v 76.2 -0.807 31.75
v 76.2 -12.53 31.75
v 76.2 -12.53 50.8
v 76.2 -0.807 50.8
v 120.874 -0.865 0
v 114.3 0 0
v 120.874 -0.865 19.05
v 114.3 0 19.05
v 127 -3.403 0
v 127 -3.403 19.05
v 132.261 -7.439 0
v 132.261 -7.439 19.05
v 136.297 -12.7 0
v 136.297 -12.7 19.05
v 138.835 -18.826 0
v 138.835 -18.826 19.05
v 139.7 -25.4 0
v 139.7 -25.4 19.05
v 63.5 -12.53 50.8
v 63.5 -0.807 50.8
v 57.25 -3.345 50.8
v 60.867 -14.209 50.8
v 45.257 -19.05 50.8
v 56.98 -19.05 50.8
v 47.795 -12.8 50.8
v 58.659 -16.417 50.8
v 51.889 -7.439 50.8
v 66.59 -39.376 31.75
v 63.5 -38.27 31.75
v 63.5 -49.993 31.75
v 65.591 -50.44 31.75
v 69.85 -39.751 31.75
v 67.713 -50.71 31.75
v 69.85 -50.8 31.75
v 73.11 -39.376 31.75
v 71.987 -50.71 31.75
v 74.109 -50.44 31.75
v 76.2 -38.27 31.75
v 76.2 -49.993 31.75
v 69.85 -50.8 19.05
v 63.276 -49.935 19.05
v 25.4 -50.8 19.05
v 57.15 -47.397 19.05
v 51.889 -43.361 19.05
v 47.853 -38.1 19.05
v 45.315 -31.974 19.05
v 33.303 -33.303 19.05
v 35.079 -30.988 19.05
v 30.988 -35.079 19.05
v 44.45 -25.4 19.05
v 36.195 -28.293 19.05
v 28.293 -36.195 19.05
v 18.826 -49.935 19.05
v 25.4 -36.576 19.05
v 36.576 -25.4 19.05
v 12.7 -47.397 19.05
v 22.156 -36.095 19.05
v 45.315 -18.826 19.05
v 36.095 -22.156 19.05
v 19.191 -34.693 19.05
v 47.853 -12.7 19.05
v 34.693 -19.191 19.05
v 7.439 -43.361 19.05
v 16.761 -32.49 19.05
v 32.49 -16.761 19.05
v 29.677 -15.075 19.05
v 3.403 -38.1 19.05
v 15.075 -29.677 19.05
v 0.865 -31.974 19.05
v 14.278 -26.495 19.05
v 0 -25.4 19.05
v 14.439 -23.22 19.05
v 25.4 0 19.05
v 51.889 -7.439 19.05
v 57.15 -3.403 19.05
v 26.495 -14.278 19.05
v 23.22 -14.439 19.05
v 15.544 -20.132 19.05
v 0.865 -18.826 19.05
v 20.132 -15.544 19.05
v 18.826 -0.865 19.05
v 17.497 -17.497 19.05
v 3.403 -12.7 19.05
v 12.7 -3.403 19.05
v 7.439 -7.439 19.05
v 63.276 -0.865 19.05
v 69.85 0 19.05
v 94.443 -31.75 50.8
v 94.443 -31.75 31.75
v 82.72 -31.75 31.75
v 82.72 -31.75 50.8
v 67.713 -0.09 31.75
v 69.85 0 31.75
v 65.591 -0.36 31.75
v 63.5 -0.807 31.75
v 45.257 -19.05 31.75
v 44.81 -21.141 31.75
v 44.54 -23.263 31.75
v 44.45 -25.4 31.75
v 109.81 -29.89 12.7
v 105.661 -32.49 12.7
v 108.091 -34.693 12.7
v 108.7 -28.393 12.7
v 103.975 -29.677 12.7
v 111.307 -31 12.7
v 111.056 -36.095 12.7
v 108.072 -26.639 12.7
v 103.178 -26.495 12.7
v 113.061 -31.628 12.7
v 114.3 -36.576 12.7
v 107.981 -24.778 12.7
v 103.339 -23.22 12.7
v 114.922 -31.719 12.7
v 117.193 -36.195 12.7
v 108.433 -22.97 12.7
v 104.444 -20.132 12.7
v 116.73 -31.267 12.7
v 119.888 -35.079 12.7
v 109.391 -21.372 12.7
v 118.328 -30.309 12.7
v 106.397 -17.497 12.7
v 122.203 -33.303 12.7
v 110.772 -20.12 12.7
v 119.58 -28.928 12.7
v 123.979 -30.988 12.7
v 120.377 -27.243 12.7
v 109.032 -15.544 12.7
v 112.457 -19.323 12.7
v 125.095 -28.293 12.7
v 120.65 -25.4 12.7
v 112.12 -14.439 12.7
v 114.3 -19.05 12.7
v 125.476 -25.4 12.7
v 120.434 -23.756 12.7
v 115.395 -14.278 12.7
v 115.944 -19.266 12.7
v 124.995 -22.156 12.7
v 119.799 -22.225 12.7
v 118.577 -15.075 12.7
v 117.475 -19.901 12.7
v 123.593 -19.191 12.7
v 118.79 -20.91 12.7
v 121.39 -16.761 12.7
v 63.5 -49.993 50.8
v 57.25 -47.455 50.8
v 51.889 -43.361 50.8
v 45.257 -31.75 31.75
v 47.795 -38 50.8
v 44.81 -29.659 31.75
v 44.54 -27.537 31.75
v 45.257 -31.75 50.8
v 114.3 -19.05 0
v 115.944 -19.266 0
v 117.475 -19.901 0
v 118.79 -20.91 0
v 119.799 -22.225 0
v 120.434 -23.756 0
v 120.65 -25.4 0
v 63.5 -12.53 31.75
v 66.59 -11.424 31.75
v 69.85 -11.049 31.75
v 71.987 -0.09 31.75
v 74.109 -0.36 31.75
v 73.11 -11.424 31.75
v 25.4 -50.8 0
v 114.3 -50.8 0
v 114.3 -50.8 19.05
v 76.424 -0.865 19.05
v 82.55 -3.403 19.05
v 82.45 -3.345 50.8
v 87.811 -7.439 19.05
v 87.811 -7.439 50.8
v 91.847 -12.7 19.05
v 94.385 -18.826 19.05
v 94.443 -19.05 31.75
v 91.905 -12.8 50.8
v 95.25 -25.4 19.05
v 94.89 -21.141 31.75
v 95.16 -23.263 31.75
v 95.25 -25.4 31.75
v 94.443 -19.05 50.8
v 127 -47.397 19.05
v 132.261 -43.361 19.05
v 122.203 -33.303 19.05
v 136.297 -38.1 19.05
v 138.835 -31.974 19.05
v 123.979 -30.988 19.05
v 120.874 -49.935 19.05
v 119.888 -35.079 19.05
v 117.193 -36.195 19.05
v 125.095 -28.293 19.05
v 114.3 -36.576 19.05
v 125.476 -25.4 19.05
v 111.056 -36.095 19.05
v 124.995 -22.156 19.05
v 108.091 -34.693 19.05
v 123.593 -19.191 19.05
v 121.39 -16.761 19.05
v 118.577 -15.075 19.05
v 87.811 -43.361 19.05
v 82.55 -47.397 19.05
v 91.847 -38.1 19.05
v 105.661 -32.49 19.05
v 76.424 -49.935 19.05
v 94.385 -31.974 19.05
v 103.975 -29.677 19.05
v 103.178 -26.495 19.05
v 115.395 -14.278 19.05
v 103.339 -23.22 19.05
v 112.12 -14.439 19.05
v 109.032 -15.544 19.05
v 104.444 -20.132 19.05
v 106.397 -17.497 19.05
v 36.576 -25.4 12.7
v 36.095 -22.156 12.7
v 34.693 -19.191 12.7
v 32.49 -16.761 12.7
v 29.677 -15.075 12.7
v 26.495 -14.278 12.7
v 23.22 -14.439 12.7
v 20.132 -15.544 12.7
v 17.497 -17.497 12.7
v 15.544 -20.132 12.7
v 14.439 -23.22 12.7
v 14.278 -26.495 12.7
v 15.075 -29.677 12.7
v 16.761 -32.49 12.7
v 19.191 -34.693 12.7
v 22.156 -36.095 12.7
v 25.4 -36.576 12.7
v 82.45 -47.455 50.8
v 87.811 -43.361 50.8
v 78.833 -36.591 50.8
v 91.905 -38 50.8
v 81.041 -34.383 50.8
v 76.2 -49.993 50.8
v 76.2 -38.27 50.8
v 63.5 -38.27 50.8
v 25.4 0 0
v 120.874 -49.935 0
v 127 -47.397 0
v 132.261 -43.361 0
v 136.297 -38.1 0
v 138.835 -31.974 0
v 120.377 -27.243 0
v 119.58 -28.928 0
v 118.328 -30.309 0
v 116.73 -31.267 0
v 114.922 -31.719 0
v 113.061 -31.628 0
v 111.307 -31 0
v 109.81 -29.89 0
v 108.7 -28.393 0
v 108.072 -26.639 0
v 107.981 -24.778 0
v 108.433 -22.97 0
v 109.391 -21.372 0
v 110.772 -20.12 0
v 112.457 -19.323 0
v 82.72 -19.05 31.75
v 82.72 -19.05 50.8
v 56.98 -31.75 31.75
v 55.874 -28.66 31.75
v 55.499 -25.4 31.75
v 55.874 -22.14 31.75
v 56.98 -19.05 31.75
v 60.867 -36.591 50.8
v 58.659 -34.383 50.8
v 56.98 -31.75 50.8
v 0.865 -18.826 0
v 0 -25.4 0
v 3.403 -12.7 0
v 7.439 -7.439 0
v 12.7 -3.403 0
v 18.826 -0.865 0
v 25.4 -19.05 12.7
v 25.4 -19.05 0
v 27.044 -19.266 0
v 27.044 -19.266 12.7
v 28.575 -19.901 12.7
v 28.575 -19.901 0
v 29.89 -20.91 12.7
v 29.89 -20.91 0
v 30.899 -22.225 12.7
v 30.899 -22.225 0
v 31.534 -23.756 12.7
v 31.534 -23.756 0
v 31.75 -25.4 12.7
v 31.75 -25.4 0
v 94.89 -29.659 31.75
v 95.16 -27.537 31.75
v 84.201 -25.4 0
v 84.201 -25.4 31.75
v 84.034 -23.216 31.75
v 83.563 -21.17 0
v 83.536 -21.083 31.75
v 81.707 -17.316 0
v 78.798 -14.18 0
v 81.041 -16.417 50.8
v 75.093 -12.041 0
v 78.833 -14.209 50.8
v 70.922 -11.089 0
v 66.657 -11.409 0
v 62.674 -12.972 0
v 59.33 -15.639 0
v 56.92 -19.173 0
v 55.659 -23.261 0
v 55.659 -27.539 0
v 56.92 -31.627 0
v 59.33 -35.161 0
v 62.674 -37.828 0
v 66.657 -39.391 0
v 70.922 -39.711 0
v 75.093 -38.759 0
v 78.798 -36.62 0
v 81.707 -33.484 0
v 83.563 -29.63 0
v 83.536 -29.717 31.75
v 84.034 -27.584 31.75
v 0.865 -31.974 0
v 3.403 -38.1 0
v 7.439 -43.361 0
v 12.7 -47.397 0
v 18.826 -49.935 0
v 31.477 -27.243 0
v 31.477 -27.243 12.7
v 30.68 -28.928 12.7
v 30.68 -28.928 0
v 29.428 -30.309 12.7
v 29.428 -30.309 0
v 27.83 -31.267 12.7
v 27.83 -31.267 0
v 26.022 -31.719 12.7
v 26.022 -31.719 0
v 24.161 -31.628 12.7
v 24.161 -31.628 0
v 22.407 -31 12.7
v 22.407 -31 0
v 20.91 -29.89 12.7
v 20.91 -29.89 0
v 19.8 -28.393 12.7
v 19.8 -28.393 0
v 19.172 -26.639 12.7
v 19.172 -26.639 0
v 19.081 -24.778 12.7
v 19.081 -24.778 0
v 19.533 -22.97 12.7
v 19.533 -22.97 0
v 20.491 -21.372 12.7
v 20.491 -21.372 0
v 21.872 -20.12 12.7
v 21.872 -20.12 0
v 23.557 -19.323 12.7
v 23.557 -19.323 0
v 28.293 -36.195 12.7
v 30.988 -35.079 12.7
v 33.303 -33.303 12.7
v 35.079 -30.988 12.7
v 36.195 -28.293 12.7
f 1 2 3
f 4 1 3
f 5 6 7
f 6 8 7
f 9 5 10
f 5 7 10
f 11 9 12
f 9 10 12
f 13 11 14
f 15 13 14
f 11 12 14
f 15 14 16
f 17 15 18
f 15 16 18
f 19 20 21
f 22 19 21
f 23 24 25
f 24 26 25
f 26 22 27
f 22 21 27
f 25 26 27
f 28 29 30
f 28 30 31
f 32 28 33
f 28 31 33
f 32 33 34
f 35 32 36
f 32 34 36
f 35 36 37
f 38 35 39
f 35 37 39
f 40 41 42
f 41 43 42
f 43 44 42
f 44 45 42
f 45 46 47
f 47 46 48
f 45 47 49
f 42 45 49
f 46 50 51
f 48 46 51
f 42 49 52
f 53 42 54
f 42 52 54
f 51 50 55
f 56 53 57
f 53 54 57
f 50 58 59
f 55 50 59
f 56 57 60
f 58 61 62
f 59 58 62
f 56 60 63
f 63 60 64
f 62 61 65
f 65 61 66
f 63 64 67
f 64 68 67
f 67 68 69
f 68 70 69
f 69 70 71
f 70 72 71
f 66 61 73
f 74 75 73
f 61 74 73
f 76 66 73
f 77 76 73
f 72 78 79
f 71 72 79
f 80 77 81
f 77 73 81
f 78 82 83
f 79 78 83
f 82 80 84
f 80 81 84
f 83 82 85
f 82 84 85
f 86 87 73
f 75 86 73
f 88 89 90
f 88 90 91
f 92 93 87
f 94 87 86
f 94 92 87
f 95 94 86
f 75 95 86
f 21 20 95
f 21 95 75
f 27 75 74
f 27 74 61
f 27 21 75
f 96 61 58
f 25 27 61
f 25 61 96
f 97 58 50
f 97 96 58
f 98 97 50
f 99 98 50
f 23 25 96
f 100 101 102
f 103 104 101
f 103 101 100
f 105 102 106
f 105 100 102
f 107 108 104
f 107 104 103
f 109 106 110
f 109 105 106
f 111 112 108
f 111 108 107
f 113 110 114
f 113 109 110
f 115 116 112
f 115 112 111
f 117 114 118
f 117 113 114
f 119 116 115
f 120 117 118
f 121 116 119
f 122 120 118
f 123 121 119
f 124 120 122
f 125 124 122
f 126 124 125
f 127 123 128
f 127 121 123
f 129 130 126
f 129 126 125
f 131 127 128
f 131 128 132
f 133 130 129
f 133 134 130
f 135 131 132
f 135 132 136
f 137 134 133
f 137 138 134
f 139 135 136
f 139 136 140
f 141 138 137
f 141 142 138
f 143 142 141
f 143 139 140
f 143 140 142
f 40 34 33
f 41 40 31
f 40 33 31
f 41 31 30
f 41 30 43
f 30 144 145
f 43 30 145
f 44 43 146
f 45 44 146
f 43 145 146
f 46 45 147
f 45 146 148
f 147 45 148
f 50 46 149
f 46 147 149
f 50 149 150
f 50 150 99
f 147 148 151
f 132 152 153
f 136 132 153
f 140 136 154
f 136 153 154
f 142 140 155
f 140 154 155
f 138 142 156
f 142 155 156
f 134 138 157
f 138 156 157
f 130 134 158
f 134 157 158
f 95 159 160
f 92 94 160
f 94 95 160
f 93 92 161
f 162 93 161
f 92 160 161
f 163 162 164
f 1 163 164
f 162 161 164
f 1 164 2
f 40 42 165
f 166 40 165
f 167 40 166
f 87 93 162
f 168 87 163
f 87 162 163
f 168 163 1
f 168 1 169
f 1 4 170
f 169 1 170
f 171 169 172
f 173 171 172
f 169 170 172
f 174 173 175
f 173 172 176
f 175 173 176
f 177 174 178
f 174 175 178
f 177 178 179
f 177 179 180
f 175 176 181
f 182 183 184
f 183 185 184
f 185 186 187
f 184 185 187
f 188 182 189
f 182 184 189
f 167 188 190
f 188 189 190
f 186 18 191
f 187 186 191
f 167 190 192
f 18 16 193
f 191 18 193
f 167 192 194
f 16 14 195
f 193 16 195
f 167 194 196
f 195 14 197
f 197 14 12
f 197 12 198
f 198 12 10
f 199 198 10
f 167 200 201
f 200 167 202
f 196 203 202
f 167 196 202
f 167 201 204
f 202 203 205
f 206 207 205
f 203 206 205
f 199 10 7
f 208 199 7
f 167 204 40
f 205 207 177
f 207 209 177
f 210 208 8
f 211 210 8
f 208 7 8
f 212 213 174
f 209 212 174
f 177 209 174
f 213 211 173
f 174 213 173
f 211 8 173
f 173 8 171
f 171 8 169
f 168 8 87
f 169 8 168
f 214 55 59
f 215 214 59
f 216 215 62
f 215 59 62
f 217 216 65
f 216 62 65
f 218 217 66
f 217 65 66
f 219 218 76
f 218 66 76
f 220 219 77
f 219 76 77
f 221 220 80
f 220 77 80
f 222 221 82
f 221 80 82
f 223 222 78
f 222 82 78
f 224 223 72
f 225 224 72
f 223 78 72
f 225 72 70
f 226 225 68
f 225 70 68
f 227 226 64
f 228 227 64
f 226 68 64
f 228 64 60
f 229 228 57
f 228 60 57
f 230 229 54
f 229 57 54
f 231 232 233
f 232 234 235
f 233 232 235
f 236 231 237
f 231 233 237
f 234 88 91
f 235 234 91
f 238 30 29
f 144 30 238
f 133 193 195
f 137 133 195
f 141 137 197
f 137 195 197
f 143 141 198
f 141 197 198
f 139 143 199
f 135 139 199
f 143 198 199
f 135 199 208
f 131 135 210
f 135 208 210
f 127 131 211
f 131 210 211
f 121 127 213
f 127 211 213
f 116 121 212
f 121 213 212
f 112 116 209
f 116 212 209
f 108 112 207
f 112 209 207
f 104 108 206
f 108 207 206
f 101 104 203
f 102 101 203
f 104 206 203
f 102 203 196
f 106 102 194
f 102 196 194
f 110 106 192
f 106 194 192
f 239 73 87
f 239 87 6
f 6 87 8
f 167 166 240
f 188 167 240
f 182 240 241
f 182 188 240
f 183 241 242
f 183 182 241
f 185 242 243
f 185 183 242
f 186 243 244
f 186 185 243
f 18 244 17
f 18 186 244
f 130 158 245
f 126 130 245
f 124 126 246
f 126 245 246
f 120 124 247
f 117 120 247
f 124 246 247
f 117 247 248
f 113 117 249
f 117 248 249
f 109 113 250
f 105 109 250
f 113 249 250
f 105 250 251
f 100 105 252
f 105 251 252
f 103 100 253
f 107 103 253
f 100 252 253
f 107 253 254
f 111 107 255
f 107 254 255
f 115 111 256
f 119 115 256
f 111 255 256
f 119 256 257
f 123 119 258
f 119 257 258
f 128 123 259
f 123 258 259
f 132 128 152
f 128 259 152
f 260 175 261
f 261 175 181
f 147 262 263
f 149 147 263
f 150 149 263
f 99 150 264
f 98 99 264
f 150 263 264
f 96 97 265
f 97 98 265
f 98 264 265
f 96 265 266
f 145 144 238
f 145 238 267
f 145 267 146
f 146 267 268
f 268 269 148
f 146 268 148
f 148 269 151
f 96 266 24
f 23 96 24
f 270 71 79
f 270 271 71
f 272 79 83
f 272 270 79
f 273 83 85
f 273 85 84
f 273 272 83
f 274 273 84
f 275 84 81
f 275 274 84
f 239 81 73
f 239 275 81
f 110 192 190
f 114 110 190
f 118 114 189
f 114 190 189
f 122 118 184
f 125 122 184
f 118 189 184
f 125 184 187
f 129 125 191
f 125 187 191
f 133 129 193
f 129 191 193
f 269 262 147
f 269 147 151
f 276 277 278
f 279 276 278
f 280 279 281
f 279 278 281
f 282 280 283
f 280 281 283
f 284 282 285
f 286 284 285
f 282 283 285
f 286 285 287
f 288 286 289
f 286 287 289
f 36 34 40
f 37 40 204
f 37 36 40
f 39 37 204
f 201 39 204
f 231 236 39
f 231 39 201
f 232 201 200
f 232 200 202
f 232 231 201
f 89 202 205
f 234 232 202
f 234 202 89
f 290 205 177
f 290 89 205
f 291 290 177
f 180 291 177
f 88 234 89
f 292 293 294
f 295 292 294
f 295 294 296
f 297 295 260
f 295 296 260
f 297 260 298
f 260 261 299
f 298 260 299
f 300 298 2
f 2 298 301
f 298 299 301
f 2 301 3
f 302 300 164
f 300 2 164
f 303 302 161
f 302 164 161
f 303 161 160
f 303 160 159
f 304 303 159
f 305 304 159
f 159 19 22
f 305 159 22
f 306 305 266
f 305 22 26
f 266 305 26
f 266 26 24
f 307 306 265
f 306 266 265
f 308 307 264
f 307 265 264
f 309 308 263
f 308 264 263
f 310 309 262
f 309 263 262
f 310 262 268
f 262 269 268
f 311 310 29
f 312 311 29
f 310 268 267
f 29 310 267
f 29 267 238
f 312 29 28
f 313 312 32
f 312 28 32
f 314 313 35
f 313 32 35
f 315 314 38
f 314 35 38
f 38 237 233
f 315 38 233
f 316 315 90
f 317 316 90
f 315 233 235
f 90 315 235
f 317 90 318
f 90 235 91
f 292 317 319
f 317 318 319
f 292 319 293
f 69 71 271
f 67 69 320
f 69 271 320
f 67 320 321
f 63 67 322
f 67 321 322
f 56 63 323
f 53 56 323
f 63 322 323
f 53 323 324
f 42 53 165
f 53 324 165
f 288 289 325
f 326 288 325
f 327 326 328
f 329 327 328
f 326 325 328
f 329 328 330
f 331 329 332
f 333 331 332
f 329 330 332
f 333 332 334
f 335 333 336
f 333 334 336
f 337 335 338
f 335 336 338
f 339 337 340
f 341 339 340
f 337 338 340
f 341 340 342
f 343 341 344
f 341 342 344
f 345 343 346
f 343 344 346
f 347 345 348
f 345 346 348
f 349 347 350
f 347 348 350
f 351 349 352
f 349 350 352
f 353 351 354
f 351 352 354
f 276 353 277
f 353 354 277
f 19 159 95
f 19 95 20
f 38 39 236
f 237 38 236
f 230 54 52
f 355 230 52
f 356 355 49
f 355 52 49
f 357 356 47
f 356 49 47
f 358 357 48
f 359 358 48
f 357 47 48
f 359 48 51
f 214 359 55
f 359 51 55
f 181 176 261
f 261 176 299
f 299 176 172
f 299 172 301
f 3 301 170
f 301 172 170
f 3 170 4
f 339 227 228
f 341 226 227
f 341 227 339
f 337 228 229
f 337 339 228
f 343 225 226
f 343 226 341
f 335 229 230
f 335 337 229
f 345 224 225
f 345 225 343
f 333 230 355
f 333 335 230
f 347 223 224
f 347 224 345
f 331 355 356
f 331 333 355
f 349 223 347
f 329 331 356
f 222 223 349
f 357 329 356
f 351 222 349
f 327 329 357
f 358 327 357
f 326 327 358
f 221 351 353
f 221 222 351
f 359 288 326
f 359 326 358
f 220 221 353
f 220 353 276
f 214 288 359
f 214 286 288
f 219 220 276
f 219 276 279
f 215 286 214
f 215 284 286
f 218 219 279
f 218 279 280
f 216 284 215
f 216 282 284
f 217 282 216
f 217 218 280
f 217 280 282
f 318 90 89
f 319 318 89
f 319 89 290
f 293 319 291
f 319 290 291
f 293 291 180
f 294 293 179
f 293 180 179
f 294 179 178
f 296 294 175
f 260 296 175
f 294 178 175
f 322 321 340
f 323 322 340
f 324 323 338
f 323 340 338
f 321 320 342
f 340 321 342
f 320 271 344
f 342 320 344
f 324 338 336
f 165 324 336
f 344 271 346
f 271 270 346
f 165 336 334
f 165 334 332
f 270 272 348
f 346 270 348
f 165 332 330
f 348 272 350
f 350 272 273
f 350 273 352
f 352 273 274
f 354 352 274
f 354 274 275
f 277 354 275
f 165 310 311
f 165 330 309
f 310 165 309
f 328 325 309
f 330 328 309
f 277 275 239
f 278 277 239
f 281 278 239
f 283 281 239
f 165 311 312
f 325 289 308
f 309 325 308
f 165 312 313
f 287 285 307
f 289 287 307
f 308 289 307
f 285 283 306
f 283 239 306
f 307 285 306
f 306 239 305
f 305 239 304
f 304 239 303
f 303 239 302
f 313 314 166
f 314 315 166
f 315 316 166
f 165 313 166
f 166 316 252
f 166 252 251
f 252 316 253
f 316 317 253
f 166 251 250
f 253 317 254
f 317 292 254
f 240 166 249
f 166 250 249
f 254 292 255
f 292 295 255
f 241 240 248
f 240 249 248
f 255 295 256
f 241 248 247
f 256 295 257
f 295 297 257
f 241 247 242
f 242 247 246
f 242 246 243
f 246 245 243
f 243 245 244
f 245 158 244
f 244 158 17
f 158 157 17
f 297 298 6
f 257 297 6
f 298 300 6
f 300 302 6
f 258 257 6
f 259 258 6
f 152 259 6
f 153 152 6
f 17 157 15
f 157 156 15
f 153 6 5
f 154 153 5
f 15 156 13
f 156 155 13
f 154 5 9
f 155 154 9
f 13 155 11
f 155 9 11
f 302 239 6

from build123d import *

# Parameters (mm, degrees)
F0_W      = 25.4
F0_H      = 31.75
F1_DEPTH  = 50.8
F2_R      = 14.351
F3_DEPTH  = 101.6
F4_W      = 12.7
F4_H      = 19.05
F5_DEPTH  = 254
F6_W      = 12.7
F6_H      = 19.05
F7_DEPTH  = 127
F9_DEPTH  = 6.35
F11_DEPTH = 6.35
F13_DEPTH = 50.8
F15_DEPTH = 558.8
F16_R     = 25.39999


# Not quite as in the source:
# - a fillet or chamfer is up to 0.001 mm smaller than in the source, because OpenCascade refuses the exact size


with BuildPart() as f1:
    # F0 (on Front) → F1 (new body)
    with BuildSketch(Plane.XZ):
        Polygon((0, 19.05), (0, 0), (139.7, 0), (139.7, 19.05), (95.25, 19.05), (69.85, 19.05), (44.45, 19.05), align=None)
        with Locations((57.15, 34.925)):
            Rectangle(F0_W, F0_H)
        with Locations((82.55, 34.925)):
            Rectangle(F0_W, F0_H)
    extrude(amount=F1_DEPTH)

    # F2 (on face) → F3 (cut)
    with BuildSketch(Plane.XY.offset(50.8)):
        with Locations((69.85, -25.4)):
            Circle(F2_R)
    extrude(amount=-F3_DEPTH, mode=Mode.SUBTRACT)

    # F4 (on face) → F5 (cut)
    with BuildSketch(Plane.XZ.offset(50.8)):
        with Locations((69.85, 41.275)):
            Rectangle(F4_W, F4_H)
    extrude(amount=-F5_DEPTH, mode=Mode.SUBTRACT)

    # F6 (on face) → F7 (cut)
    with BuildSketch(Plane.YZ.offset(95.25)):
        with Locations((-25.4, 41.275)):
            Rectangle(F6_W, F6_H)
    extrude(amount=-F7_DEPTH, mode=Mode.SUBTRACT)

    # F8 (on face) → F9 (cut)
    with BuildSketch(Plane.XY.offset(19.05)):
        with BuildLine():
            ThreePointArc((114.3, -36.576), (122.2026253865, -33.3026253865), (125.476, -25.4))
            ThreePointArc((125.476, -25.4), (106.3973746135, -17.4973746135), (114.3, -36.576))
        make_face()
    extrude(amount=-F9_DEPTH, mode=Mode.SUBTRACT)

    # F10 (on face) → F11 (cut)
    with BuildSketch(Plane.XY.offset(19.05)):
        with BuildLine():
            ThreePointArc((25.4, -36.576), (33.3026253865, -33.3026253865), (36.576, -25.4))
            ThreePointArc((36.576, -25.4), (17.4973746135, -17.4973746135), (25.4, -36.576))
        make_face()
    extrude(amount=-F11_DEPTH, mode=Mode.SUBTRACT)

    # F12 (on face) → F13 (cut)
    with BuildSketch(Plane(origin=(0, 0, 0), x_dir=(1, 0, 0), z_dir=(0, 0, -1))):
        with BuildLine():
            ThreePointArc((25.4, 19.05), (29.8901280605, 20.9098719395), (31.75, 25.4))
            ThreePointArc((31.75, 25.4), (20.9098719395, 29.8901280605), (25.4, 19.05))
        make_face()
    extrude(amount=-F13_DEPTH, mode=Mode.SUBTRACT)

    # F14 (on face) → F15 (cut)
    with BuildSketch(Plane(origin=(0, 0, 0), x_dir=(1, 0, 0), z_dir=(0, 0, -1))):
        with BuildLine():
            ThreePointArc((114.3, 19.05), (118.7901280605, 20.9098719395), (120.65, 25.4))
            ThreePointArc((120.65, 25.4), (109.8098719395, 29.8901280605), (114.3, 19.05))
        make_face()
    extrude(amount=-F15_DEPTH, mode=Mode.SUBTRACT)

    # F16 (radius 25.4 in the source; OpenCascade refuses exactly that, so slightly less here)
    f16_edges = [f1.edges().sort_by_distance(p)[0] for p in [
        (95.25, 0, 34.925),
        (95.25, -50.8, 34.925),
        (44.45, 0, 34.925),
        (44.45, -50.8, 34.925),
        (0, -50.8, 9.525),
        (0, 0, 9.525),
        (139.7, -50.8, 9.525),
        (139.7, 0, 9.525),
    ]]
    fillet(f16_edges, radius=F16_R)


solid = f1.part
